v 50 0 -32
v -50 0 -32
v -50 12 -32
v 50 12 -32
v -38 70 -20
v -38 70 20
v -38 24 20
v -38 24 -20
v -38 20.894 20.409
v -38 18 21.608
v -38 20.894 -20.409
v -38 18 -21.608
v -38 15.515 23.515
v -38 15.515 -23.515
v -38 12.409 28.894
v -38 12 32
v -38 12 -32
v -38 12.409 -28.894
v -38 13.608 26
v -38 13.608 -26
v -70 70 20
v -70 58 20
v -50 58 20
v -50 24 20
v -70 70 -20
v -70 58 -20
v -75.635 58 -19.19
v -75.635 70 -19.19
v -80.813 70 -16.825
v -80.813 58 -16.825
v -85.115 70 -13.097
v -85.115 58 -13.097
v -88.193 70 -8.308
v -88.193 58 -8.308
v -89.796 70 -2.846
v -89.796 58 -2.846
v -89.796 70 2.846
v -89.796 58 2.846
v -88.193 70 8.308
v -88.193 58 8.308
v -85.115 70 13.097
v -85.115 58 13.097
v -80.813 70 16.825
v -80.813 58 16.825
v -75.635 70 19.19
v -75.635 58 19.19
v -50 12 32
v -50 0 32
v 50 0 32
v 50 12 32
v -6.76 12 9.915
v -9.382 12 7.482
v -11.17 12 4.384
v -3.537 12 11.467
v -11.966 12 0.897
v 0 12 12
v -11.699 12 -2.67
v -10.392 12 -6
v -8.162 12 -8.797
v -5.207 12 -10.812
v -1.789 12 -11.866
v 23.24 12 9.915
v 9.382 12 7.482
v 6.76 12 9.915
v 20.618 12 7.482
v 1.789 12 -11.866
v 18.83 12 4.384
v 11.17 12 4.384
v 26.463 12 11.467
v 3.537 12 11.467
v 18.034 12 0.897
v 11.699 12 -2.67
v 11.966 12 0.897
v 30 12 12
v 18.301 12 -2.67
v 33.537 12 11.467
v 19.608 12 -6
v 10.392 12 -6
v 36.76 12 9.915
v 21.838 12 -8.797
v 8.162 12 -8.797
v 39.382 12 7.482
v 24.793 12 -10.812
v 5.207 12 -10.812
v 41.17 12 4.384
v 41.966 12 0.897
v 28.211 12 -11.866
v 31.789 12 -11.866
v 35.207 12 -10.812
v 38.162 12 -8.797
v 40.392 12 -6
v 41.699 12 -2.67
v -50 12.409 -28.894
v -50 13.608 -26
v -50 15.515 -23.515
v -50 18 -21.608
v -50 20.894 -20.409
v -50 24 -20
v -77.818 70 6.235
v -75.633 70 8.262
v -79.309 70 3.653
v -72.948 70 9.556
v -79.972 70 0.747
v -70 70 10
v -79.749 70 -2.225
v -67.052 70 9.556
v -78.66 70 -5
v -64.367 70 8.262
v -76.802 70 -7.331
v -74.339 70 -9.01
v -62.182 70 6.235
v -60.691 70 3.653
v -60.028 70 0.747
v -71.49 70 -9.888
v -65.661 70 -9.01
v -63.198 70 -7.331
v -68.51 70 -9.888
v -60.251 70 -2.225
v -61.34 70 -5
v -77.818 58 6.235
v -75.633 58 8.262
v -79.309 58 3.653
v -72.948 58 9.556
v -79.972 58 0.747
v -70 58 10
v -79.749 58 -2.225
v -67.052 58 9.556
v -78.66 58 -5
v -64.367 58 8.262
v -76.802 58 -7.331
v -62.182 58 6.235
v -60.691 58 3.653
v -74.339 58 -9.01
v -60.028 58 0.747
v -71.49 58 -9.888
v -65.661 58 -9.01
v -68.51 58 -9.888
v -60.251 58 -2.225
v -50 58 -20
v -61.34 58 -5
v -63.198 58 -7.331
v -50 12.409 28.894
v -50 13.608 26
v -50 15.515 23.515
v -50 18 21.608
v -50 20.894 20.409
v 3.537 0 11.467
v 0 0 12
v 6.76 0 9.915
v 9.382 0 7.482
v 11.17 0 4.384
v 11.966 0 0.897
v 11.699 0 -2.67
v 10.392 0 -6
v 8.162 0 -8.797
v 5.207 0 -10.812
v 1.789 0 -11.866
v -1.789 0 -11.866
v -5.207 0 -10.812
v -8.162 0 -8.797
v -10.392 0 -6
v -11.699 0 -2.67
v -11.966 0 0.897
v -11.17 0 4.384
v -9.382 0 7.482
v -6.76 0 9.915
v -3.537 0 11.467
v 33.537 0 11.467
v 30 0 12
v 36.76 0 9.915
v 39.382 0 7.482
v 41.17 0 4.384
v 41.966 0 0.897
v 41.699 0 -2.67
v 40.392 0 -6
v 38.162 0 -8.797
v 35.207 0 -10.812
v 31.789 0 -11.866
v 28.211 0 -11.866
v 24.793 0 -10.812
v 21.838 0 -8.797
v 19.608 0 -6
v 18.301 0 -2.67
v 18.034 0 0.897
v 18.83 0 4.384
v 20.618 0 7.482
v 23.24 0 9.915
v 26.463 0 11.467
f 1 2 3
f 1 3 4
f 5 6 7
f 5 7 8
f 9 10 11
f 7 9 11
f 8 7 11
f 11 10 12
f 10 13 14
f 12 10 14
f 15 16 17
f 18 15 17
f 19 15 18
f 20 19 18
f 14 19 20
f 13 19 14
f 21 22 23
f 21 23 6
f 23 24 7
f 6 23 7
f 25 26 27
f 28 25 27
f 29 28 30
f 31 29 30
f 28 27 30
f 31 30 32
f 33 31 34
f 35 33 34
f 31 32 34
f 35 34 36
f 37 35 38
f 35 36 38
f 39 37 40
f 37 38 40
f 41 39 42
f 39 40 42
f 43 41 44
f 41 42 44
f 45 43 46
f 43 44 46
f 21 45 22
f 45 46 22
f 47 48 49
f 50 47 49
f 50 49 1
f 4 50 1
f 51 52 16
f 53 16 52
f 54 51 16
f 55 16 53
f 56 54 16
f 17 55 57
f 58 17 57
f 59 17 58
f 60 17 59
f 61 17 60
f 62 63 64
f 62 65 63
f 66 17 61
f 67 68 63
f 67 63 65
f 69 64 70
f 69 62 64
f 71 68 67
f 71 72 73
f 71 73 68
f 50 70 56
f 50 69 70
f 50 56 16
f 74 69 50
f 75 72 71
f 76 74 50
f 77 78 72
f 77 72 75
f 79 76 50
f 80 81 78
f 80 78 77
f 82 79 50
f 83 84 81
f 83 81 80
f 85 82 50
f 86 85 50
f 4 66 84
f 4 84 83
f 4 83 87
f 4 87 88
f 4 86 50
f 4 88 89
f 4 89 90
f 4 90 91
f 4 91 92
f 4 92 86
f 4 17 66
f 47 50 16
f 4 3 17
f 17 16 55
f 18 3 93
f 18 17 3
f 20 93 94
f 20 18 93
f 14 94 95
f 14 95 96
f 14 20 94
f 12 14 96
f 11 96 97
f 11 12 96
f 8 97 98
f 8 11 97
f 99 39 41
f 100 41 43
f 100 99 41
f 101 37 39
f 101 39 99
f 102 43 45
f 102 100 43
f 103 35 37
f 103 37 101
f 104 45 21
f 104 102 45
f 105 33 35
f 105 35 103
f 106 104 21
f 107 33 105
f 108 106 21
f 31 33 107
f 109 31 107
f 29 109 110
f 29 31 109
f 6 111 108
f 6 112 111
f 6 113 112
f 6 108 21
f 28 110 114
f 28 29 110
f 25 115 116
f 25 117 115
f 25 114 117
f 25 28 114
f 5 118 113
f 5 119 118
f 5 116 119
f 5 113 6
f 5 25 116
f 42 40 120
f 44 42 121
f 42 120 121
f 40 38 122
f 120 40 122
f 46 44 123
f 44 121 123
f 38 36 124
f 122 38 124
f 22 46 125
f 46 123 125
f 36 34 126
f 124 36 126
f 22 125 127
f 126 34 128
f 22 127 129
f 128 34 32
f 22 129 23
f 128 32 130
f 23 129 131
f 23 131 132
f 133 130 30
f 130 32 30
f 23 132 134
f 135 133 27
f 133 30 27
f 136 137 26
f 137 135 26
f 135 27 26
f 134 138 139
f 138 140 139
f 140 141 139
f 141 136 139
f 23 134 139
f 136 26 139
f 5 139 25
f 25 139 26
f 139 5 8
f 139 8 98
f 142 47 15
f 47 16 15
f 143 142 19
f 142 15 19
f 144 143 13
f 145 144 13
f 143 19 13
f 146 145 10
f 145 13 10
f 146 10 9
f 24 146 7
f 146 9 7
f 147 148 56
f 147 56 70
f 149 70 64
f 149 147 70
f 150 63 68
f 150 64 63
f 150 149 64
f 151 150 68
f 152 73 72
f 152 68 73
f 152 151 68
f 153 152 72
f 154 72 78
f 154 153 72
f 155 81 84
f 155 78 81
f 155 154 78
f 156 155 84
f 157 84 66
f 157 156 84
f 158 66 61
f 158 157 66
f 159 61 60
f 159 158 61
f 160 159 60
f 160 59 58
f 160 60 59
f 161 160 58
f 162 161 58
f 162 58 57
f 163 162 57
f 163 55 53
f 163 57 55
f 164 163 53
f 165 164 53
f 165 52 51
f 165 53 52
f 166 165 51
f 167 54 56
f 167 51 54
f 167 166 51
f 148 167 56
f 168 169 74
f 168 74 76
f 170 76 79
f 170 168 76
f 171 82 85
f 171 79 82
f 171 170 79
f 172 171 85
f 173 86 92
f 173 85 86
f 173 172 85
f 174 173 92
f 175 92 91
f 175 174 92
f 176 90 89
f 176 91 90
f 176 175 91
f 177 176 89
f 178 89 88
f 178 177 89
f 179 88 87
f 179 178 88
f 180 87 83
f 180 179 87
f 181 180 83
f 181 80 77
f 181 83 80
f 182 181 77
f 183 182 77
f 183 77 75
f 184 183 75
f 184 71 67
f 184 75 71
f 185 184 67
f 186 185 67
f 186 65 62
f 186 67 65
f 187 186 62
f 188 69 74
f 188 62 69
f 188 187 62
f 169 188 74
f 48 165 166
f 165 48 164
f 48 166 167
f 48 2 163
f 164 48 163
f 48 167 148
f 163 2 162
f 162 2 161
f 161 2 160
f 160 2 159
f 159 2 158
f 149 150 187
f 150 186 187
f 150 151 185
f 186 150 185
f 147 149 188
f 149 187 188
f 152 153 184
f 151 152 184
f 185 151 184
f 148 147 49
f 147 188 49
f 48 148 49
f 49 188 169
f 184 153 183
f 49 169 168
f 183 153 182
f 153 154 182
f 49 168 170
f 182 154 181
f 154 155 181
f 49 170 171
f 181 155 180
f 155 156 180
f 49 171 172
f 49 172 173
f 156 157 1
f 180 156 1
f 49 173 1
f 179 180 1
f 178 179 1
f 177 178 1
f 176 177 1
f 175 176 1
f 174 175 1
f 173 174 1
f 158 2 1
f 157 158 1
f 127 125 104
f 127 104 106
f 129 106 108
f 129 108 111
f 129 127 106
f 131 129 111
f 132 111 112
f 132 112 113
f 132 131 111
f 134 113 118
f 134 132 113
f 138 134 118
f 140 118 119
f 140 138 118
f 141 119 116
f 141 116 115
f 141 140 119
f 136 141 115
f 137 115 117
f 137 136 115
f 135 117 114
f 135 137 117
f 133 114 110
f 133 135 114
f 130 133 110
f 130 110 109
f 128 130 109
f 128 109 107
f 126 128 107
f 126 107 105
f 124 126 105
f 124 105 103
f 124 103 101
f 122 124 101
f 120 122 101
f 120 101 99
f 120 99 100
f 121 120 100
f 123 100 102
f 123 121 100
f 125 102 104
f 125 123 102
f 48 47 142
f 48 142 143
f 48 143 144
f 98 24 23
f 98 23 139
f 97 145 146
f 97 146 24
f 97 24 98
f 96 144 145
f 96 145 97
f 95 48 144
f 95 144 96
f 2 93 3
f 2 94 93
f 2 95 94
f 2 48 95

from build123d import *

# Parameters (mm, degrees)
SKETCH1_W               = 100
SKETCH1_H               = 64
BOSS_EXTRUDE1_DEPTH     = 12
CUT_EXTRUDE1_DEPTH      = 61.564015719
CUT_EXTRUDE1_DEPTH_BACK = 61.564015719
SKETCH2_R               = 12
SKETCH3_W               = 12
SKETCH3_H               = 40
BOSS_EXTRUDE2_DEPTH     = 46
SKETCH4_R               = 10
BOSS_EXTRUDE3_DEPTH     = 12
FILLET1_R               = 12


with BuildPart() as part:
    # Sketch1 → Boss-Extrude1 (new body)
    with BuildSketch(Plane(origin=(0, 0, 0), x_dir=(1, 0, 0), z_dir=(0, 1, 0))):
        Rectangle(SKETCH1_W, SKETCH1_H)
    extrude(amount=BOSS_EXTRUDE1_DEPTH)

    # Sketch2 → Cut-Extrude1 (cut, two sides: drawn at the far end of the back side and taken through both)
    with BuildSketch(Plane(origin=(0, 12, 0), x_dir=(1, 0, 0), z_dir=(0, 1, 0)).offset(-CUT_EXTRUDE1_DEPTH_BACK)):
        with Locations(Location((0, 0, 0), (0, 0, 270))):
            Circle(SKETCH2_R)
        with Locations(Location((30, 0, 0), (0, 0, 270))):
            Circle(SKETCH2_R)
    extrude(amount=CUT_EXTRUDE1_DEPTH + CUT_EXTRUDE1_DEPTH_BACK, mode=Mode.SUBTRACT)

    # Sketch3 → Boss-Extrude2 (add)
    with BuildSketch(Plane(origin=(0, 12, 0), x_dir=(1, 0, 0), z_dir=(0, 1, 0))):
        with Locations((-44, 0)):
            Rectangle(SKETCH3_W, SKETCH3_H)
    extrude(amount=BOSS_EXTRUDE2_DEPTH)

    # Sketch4 → Boss-Extrude3 (add)
    with BuildSketch(Plane(origin=(0, 58, 0), x_dir=(1, 0, 0), z_dir=(0, 1, 0))):
        with BuildLine():
            Line((-50, 20), (-70, 20))
            ThreePointArc((-70, 20), (-90, 0), (-70, -20))
            Line((-70, -20), (-50, -20))
            Line((-50, -20), (-38, -20))
            Line((-38, -20), (-38, 20))
            Line((-38, 20), (-50, 20))
        make_face()
        with Locations(Location((-70, 0, 0), (0, 0, 270))):
            Circle(SKETCH4_R, mode=Mode.SUBTRACT)
    extrude(amount=BOSS_EXTRUDE3_DEPTH)

    # Fillet1
    fillet1_edges = [part.edges().sort_by_distance(p)[0] for p in [
        (-44, 12, -20),
        (-44, 12, 20),
    ]]
    fillet(fillet1_edges, radius=FILLET1_R - 0.0001)  # a hair under: the kernel refuses the full size


solid = part.part
